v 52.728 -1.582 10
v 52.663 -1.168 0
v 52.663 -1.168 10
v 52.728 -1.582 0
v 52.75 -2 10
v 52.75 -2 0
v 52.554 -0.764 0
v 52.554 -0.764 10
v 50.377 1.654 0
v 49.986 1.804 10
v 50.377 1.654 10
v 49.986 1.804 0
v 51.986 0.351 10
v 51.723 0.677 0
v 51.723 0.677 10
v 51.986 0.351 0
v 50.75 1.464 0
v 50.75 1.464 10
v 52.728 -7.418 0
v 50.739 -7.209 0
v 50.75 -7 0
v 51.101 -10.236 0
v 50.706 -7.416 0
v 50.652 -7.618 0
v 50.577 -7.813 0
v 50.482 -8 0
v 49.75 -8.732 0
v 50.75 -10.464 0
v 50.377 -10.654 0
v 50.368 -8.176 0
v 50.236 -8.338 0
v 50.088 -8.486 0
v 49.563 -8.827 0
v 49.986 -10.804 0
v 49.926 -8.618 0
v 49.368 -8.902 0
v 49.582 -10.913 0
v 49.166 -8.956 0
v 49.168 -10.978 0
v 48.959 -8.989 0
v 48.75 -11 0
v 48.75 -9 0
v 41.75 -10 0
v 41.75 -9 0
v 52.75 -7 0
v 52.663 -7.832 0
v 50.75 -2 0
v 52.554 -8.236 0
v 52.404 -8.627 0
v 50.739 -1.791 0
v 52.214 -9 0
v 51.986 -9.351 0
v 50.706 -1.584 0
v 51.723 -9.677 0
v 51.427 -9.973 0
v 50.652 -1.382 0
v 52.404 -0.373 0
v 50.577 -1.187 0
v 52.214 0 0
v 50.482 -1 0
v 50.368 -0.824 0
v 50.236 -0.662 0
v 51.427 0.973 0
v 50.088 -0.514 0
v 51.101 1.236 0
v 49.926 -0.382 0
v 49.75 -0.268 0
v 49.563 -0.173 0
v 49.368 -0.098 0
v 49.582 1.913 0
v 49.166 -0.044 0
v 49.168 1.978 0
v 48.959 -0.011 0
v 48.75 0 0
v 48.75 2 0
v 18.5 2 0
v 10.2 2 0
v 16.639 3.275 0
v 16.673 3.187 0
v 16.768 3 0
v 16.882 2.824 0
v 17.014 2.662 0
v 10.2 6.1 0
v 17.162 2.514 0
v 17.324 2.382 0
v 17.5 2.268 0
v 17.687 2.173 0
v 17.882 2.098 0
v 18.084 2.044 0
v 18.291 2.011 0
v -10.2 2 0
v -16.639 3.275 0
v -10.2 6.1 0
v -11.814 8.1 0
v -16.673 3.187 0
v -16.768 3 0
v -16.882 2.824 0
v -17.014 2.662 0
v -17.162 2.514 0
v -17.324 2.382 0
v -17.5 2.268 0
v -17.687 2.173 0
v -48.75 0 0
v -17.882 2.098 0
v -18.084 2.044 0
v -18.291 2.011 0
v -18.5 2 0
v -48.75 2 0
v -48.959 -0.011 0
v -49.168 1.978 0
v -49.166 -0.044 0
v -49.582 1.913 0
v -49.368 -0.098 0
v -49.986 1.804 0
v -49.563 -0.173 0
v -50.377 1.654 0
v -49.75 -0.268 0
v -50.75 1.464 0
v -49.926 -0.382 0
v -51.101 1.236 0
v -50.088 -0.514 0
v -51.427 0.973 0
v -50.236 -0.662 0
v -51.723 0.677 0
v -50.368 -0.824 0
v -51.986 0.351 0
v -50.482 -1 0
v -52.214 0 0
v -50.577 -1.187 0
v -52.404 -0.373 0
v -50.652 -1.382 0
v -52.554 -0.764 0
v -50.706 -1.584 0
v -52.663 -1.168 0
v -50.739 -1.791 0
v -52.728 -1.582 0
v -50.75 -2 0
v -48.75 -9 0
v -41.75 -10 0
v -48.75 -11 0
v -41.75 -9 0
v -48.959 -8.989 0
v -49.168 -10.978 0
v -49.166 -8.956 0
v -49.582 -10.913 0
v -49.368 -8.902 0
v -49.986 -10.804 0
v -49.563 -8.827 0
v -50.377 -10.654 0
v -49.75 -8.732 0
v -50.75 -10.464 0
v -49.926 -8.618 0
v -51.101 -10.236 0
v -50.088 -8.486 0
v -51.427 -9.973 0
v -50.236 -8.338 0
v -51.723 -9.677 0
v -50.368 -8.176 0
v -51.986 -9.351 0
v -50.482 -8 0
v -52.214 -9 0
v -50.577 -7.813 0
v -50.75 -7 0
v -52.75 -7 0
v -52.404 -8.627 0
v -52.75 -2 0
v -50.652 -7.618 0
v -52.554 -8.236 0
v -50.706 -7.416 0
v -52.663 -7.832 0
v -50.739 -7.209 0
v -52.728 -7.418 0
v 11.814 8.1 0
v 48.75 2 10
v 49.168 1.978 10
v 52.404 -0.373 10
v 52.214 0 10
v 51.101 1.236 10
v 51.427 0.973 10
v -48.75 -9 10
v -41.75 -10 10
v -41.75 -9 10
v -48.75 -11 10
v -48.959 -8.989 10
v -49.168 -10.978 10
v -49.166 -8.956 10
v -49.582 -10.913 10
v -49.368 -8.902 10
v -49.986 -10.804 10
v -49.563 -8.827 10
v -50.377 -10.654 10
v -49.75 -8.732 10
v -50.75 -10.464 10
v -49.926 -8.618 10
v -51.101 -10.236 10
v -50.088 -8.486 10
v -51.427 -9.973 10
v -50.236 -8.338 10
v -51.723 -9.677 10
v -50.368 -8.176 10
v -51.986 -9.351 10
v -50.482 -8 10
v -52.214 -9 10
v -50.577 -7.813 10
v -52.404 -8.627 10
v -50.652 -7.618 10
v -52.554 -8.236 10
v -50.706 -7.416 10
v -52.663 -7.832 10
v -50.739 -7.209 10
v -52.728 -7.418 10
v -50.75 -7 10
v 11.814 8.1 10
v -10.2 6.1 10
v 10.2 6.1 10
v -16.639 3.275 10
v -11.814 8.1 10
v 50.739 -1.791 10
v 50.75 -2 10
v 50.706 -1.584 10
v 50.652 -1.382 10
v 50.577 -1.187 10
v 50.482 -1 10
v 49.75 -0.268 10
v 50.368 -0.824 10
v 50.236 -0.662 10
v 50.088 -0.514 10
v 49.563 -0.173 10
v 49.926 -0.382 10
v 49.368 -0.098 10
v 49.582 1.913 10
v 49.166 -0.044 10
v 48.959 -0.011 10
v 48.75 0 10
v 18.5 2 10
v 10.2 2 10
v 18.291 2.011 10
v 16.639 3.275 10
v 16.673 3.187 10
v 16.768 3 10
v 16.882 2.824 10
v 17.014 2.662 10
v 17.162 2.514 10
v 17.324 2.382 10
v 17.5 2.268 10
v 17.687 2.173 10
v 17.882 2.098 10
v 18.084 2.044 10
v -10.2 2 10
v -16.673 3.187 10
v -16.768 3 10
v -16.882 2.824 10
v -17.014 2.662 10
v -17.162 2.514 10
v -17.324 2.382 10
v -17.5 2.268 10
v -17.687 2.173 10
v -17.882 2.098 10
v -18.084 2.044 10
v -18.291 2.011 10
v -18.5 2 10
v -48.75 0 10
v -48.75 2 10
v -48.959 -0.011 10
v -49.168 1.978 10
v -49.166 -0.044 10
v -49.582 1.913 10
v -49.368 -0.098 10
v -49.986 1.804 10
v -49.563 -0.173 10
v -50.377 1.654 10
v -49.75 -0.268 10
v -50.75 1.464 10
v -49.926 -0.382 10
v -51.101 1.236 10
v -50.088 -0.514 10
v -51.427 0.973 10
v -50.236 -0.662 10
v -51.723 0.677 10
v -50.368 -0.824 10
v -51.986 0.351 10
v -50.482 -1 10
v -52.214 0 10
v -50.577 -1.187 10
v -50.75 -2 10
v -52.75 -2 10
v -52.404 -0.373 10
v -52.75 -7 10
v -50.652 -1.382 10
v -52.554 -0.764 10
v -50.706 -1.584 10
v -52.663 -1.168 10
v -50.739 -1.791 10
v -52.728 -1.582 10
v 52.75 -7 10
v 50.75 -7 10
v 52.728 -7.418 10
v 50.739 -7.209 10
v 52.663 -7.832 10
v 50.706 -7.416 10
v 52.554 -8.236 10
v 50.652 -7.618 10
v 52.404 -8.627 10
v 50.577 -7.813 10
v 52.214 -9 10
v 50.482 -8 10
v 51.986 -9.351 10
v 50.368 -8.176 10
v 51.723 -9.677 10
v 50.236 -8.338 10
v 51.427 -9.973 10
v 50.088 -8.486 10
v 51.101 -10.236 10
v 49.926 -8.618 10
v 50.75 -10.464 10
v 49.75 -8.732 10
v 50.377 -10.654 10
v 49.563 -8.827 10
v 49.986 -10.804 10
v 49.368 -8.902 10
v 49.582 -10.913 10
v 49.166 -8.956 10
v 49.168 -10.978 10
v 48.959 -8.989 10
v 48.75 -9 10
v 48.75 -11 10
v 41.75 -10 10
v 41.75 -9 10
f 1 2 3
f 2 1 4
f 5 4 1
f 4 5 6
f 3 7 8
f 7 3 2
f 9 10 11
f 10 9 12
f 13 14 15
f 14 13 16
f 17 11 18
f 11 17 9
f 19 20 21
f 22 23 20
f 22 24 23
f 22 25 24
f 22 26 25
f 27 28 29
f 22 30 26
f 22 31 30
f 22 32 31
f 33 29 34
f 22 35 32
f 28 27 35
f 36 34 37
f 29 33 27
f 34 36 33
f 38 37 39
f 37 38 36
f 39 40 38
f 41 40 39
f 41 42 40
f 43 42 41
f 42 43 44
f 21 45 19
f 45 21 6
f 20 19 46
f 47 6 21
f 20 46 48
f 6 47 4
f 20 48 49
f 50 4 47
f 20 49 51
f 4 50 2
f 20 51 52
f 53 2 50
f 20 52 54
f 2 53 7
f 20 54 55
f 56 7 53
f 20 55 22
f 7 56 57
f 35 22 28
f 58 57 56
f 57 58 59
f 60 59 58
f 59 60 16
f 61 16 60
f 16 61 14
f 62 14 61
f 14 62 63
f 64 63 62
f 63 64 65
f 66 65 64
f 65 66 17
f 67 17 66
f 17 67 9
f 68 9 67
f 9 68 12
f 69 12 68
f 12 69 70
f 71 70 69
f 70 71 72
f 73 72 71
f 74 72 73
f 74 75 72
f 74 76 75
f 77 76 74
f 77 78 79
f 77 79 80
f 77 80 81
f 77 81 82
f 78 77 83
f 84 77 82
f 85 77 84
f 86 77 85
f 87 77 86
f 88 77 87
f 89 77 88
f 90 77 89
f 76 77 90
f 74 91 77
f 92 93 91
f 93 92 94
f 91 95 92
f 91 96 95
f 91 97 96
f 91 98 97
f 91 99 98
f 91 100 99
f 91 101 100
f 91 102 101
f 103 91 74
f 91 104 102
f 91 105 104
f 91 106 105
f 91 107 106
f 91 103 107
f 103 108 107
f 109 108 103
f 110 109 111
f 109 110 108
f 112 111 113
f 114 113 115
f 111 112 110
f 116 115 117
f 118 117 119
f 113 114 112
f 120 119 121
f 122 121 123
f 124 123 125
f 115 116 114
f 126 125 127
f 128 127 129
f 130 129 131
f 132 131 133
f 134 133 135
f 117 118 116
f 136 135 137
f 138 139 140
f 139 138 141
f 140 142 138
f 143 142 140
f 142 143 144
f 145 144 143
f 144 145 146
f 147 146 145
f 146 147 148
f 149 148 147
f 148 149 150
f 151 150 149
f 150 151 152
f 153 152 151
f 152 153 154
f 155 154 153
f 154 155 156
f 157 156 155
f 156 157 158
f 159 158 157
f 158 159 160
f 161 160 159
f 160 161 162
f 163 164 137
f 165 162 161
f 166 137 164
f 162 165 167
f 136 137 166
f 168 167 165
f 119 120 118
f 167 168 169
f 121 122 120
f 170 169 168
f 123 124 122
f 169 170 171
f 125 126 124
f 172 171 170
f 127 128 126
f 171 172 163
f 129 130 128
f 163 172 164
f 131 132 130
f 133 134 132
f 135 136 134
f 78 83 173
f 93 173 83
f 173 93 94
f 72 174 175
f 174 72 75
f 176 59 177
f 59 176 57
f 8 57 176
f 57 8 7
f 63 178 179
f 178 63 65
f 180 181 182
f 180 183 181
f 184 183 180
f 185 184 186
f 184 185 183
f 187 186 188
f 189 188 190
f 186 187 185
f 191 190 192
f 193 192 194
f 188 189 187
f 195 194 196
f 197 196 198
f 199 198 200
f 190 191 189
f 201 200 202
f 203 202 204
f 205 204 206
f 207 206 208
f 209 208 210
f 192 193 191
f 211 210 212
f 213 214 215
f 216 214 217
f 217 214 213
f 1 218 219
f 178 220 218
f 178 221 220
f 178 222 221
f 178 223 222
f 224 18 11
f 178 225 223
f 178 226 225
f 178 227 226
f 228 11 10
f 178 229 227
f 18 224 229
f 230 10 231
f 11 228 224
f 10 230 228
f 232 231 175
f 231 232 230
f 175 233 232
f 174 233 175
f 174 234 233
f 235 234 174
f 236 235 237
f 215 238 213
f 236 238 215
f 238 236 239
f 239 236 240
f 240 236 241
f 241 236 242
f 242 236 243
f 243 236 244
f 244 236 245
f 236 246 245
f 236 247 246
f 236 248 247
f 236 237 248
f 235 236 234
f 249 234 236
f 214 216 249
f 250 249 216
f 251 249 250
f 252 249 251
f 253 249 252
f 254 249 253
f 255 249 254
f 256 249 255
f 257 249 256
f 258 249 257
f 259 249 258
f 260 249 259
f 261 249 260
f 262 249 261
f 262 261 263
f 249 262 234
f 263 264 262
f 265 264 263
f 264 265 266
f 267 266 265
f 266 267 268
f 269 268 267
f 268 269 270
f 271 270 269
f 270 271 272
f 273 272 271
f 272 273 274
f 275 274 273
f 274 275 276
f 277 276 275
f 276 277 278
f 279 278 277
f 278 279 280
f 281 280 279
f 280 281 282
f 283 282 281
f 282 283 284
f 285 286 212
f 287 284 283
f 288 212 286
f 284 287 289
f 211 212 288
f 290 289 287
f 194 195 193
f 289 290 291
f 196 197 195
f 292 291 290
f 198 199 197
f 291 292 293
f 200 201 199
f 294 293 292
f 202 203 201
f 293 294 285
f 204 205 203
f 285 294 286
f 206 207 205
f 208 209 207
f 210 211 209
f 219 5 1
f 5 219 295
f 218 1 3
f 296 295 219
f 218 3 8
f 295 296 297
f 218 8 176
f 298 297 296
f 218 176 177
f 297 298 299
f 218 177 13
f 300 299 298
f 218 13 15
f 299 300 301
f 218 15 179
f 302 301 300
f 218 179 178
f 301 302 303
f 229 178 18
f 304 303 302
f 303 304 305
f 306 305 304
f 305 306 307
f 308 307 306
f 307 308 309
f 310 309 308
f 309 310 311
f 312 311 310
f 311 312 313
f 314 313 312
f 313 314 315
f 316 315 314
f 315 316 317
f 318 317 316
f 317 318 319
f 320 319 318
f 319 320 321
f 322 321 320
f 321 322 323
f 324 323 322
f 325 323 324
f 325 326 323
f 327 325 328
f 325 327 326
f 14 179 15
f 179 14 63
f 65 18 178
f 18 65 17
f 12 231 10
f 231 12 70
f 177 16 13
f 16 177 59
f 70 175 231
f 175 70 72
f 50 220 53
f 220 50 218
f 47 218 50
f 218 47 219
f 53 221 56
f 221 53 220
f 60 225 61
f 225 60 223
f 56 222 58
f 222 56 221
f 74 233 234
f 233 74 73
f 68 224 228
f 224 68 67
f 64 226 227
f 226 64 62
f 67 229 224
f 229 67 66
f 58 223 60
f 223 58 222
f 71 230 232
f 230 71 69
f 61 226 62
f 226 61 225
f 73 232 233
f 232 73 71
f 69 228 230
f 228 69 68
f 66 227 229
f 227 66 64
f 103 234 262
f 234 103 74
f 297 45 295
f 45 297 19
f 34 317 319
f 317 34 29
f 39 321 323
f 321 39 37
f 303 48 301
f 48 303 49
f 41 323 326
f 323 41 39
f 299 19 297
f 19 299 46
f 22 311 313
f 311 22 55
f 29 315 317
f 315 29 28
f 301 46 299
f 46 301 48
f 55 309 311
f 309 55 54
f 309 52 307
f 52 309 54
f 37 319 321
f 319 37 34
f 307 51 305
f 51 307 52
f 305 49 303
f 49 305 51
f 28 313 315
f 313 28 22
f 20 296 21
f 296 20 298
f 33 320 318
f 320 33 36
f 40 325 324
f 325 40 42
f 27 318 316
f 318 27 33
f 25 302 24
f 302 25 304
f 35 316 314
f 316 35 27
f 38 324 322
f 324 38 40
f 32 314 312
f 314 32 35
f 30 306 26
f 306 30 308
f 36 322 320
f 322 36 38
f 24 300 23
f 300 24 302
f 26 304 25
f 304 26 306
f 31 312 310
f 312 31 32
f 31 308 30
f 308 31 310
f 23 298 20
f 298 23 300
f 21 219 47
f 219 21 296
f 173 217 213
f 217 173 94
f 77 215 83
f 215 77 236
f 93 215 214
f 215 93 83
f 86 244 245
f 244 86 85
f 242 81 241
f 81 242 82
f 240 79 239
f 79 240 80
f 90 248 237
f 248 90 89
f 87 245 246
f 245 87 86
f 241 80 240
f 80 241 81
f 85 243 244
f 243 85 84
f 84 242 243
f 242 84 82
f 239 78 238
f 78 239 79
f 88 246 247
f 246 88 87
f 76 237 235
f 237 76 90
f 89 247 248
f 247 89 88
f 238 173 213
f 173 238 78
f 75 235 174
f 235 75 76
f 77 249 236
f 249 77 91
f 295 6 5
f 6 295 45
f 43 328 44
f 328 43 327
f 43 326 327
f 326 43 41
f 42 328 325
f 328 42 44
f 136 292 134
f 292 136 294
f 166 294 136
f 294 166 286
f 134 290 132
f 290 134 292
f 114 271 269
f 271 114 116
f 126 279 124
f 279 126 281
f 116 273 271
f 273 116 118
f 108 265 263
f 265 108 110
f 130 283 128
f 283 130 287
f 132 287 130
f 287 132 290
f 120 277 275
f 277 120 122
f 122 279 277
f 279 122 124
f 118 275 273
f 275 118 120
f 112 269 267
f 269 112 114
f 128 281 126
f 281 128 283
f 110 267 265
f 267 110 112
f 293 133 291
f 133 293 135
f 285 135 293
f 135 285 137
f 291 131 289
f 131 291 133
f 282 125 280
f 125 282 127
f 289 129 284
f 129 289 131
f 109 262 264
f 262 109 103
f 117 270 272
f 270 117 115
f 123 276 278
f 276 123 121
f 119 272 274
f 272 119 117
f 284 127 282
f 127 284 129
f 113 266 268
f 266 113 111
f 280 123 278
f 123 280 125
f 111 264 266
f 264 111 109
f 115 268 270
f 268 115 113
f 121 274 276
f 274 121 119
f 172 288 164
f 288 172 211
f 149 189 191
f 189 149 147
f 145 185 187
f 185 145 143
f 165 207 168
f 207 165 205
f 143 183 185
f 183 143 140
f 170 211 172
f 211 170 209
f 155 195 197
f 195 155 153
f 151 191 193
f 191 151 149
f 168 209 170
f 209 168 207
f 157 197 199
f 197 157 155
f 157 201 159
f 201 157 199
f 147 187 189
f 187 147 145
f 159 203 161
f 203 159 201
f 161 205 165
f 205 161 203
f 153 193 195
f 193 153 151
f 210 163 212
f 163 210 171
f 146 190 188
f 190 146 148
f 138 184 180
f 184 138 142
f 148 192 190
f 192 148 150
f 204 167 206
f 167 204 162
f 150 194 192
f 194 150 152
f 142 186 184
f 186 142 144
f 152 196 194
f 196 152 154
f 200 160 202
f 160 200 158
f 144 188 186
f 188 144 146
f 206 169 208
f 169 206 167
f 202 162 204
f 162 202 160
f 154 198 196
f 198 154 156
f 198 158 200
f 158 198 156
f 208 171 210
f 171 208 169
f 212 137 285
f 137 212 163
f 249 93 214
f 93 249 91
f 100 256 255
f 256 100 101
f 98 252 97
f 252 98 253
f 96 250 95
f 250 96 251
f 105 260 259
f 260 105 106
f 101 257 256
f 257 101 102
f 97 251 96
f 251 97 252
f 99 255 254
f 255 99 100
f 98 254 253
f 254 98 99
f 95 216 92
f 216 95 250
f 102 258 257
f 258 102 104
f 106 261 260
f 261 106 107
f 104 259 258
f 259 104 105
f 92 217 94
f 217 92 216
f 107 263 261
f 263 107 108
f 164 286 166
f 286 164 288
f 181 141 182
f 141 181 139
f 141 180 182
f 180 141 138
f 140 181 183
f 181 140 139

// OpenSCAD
// Values are for TomTom Start 60

// Height of device, measured where bracket will be placed.
device_height=101.5;

// Depth of device; measured near border of device.
device_depth=9;

// Bracket height, must correspond to latch space at bar. 10 is a reasonable value.
height=10;

// Hook in front of the device.
hook_length=7;


/* [Hidden] */
// Values for Xperia Active
// device_height=55;
// device_depth=16;
// hook_length=7;

// no changes below this line
// --------------------------
// device independent, must fit connector
thickness=2;


// convert to object internal values
width=device_height-2*thickness;
depth=device_depth-2*thickness;

module arm () {
// main beam
cube([width/2, thickness, height]);

// first corner

difference() {
  difference() {
    translate([width/2,-thickness,0])cylinder(r=2*thickness, h=height, $fn=60);
    translate([width/2,-thickness,0])cylinder(r=thickness, h=height, $fn=60);
  }
  union() {
    translate([width/2-2*thickness,-3*thickness,0])cube([2*thickness,3*thickness, height]);
    translate([width/2,-3*thickness,0])cube([2*thickness,2*thickness, height]);
  }
};

// short beam
translate([width/2+thickness,-thickness-depth,0])cube([thickness,depth,height]);

// second corner
difference() {
  difference() {
    translate([width/2,-thickness-depth,0])cylinder(r=2*thickness, h=height, $fn=60);
    translate([width/2,-thickness-depth,0])cylinder(r=thickness, h=height, $fn=60);
  }
  union() {
    translate([width/2-2*thickness,-3*thickness-depth,0])cube([2*thickness,4*thickness, height]);
    translate([width/2-thickness,-thickness-depth,0])cube([2*thickness,2*thickness, height]);
  }
};

// make end hook and move in place
translate([width/2-hook_length,-thickness*2-depth,0])
  linear_extrude(height=height)polygon(points=[[0,0],[hook_length,0],[hook_length,-thickness],[0,-thickness/2]]);

// do not change, this is the connector part
fixation_outer_width=37;
fixation_inner_width=20.4;
fixation_inner_depth=6.1;
fixation_outer_depth=fixation_inner_depth+2;

difference () {
 difference () {
  difference () {
    cube([fixation_outer_width/2, fixation_outer_depth, height]);
    cube([fixation_inner_width/2, fixation_inner_depth, height]);
   }
   translate([fixation_outer_width/2,thickness+2,0])cylinder(r=2, h=height, $fn=60);
 }
 translate([fixation_outer_width/2-sqrt(2),sqrt(2)*2,0])rotate(45)cube([10,10,height]);
};
};
// end module arm

arm();
mirror() arm();
